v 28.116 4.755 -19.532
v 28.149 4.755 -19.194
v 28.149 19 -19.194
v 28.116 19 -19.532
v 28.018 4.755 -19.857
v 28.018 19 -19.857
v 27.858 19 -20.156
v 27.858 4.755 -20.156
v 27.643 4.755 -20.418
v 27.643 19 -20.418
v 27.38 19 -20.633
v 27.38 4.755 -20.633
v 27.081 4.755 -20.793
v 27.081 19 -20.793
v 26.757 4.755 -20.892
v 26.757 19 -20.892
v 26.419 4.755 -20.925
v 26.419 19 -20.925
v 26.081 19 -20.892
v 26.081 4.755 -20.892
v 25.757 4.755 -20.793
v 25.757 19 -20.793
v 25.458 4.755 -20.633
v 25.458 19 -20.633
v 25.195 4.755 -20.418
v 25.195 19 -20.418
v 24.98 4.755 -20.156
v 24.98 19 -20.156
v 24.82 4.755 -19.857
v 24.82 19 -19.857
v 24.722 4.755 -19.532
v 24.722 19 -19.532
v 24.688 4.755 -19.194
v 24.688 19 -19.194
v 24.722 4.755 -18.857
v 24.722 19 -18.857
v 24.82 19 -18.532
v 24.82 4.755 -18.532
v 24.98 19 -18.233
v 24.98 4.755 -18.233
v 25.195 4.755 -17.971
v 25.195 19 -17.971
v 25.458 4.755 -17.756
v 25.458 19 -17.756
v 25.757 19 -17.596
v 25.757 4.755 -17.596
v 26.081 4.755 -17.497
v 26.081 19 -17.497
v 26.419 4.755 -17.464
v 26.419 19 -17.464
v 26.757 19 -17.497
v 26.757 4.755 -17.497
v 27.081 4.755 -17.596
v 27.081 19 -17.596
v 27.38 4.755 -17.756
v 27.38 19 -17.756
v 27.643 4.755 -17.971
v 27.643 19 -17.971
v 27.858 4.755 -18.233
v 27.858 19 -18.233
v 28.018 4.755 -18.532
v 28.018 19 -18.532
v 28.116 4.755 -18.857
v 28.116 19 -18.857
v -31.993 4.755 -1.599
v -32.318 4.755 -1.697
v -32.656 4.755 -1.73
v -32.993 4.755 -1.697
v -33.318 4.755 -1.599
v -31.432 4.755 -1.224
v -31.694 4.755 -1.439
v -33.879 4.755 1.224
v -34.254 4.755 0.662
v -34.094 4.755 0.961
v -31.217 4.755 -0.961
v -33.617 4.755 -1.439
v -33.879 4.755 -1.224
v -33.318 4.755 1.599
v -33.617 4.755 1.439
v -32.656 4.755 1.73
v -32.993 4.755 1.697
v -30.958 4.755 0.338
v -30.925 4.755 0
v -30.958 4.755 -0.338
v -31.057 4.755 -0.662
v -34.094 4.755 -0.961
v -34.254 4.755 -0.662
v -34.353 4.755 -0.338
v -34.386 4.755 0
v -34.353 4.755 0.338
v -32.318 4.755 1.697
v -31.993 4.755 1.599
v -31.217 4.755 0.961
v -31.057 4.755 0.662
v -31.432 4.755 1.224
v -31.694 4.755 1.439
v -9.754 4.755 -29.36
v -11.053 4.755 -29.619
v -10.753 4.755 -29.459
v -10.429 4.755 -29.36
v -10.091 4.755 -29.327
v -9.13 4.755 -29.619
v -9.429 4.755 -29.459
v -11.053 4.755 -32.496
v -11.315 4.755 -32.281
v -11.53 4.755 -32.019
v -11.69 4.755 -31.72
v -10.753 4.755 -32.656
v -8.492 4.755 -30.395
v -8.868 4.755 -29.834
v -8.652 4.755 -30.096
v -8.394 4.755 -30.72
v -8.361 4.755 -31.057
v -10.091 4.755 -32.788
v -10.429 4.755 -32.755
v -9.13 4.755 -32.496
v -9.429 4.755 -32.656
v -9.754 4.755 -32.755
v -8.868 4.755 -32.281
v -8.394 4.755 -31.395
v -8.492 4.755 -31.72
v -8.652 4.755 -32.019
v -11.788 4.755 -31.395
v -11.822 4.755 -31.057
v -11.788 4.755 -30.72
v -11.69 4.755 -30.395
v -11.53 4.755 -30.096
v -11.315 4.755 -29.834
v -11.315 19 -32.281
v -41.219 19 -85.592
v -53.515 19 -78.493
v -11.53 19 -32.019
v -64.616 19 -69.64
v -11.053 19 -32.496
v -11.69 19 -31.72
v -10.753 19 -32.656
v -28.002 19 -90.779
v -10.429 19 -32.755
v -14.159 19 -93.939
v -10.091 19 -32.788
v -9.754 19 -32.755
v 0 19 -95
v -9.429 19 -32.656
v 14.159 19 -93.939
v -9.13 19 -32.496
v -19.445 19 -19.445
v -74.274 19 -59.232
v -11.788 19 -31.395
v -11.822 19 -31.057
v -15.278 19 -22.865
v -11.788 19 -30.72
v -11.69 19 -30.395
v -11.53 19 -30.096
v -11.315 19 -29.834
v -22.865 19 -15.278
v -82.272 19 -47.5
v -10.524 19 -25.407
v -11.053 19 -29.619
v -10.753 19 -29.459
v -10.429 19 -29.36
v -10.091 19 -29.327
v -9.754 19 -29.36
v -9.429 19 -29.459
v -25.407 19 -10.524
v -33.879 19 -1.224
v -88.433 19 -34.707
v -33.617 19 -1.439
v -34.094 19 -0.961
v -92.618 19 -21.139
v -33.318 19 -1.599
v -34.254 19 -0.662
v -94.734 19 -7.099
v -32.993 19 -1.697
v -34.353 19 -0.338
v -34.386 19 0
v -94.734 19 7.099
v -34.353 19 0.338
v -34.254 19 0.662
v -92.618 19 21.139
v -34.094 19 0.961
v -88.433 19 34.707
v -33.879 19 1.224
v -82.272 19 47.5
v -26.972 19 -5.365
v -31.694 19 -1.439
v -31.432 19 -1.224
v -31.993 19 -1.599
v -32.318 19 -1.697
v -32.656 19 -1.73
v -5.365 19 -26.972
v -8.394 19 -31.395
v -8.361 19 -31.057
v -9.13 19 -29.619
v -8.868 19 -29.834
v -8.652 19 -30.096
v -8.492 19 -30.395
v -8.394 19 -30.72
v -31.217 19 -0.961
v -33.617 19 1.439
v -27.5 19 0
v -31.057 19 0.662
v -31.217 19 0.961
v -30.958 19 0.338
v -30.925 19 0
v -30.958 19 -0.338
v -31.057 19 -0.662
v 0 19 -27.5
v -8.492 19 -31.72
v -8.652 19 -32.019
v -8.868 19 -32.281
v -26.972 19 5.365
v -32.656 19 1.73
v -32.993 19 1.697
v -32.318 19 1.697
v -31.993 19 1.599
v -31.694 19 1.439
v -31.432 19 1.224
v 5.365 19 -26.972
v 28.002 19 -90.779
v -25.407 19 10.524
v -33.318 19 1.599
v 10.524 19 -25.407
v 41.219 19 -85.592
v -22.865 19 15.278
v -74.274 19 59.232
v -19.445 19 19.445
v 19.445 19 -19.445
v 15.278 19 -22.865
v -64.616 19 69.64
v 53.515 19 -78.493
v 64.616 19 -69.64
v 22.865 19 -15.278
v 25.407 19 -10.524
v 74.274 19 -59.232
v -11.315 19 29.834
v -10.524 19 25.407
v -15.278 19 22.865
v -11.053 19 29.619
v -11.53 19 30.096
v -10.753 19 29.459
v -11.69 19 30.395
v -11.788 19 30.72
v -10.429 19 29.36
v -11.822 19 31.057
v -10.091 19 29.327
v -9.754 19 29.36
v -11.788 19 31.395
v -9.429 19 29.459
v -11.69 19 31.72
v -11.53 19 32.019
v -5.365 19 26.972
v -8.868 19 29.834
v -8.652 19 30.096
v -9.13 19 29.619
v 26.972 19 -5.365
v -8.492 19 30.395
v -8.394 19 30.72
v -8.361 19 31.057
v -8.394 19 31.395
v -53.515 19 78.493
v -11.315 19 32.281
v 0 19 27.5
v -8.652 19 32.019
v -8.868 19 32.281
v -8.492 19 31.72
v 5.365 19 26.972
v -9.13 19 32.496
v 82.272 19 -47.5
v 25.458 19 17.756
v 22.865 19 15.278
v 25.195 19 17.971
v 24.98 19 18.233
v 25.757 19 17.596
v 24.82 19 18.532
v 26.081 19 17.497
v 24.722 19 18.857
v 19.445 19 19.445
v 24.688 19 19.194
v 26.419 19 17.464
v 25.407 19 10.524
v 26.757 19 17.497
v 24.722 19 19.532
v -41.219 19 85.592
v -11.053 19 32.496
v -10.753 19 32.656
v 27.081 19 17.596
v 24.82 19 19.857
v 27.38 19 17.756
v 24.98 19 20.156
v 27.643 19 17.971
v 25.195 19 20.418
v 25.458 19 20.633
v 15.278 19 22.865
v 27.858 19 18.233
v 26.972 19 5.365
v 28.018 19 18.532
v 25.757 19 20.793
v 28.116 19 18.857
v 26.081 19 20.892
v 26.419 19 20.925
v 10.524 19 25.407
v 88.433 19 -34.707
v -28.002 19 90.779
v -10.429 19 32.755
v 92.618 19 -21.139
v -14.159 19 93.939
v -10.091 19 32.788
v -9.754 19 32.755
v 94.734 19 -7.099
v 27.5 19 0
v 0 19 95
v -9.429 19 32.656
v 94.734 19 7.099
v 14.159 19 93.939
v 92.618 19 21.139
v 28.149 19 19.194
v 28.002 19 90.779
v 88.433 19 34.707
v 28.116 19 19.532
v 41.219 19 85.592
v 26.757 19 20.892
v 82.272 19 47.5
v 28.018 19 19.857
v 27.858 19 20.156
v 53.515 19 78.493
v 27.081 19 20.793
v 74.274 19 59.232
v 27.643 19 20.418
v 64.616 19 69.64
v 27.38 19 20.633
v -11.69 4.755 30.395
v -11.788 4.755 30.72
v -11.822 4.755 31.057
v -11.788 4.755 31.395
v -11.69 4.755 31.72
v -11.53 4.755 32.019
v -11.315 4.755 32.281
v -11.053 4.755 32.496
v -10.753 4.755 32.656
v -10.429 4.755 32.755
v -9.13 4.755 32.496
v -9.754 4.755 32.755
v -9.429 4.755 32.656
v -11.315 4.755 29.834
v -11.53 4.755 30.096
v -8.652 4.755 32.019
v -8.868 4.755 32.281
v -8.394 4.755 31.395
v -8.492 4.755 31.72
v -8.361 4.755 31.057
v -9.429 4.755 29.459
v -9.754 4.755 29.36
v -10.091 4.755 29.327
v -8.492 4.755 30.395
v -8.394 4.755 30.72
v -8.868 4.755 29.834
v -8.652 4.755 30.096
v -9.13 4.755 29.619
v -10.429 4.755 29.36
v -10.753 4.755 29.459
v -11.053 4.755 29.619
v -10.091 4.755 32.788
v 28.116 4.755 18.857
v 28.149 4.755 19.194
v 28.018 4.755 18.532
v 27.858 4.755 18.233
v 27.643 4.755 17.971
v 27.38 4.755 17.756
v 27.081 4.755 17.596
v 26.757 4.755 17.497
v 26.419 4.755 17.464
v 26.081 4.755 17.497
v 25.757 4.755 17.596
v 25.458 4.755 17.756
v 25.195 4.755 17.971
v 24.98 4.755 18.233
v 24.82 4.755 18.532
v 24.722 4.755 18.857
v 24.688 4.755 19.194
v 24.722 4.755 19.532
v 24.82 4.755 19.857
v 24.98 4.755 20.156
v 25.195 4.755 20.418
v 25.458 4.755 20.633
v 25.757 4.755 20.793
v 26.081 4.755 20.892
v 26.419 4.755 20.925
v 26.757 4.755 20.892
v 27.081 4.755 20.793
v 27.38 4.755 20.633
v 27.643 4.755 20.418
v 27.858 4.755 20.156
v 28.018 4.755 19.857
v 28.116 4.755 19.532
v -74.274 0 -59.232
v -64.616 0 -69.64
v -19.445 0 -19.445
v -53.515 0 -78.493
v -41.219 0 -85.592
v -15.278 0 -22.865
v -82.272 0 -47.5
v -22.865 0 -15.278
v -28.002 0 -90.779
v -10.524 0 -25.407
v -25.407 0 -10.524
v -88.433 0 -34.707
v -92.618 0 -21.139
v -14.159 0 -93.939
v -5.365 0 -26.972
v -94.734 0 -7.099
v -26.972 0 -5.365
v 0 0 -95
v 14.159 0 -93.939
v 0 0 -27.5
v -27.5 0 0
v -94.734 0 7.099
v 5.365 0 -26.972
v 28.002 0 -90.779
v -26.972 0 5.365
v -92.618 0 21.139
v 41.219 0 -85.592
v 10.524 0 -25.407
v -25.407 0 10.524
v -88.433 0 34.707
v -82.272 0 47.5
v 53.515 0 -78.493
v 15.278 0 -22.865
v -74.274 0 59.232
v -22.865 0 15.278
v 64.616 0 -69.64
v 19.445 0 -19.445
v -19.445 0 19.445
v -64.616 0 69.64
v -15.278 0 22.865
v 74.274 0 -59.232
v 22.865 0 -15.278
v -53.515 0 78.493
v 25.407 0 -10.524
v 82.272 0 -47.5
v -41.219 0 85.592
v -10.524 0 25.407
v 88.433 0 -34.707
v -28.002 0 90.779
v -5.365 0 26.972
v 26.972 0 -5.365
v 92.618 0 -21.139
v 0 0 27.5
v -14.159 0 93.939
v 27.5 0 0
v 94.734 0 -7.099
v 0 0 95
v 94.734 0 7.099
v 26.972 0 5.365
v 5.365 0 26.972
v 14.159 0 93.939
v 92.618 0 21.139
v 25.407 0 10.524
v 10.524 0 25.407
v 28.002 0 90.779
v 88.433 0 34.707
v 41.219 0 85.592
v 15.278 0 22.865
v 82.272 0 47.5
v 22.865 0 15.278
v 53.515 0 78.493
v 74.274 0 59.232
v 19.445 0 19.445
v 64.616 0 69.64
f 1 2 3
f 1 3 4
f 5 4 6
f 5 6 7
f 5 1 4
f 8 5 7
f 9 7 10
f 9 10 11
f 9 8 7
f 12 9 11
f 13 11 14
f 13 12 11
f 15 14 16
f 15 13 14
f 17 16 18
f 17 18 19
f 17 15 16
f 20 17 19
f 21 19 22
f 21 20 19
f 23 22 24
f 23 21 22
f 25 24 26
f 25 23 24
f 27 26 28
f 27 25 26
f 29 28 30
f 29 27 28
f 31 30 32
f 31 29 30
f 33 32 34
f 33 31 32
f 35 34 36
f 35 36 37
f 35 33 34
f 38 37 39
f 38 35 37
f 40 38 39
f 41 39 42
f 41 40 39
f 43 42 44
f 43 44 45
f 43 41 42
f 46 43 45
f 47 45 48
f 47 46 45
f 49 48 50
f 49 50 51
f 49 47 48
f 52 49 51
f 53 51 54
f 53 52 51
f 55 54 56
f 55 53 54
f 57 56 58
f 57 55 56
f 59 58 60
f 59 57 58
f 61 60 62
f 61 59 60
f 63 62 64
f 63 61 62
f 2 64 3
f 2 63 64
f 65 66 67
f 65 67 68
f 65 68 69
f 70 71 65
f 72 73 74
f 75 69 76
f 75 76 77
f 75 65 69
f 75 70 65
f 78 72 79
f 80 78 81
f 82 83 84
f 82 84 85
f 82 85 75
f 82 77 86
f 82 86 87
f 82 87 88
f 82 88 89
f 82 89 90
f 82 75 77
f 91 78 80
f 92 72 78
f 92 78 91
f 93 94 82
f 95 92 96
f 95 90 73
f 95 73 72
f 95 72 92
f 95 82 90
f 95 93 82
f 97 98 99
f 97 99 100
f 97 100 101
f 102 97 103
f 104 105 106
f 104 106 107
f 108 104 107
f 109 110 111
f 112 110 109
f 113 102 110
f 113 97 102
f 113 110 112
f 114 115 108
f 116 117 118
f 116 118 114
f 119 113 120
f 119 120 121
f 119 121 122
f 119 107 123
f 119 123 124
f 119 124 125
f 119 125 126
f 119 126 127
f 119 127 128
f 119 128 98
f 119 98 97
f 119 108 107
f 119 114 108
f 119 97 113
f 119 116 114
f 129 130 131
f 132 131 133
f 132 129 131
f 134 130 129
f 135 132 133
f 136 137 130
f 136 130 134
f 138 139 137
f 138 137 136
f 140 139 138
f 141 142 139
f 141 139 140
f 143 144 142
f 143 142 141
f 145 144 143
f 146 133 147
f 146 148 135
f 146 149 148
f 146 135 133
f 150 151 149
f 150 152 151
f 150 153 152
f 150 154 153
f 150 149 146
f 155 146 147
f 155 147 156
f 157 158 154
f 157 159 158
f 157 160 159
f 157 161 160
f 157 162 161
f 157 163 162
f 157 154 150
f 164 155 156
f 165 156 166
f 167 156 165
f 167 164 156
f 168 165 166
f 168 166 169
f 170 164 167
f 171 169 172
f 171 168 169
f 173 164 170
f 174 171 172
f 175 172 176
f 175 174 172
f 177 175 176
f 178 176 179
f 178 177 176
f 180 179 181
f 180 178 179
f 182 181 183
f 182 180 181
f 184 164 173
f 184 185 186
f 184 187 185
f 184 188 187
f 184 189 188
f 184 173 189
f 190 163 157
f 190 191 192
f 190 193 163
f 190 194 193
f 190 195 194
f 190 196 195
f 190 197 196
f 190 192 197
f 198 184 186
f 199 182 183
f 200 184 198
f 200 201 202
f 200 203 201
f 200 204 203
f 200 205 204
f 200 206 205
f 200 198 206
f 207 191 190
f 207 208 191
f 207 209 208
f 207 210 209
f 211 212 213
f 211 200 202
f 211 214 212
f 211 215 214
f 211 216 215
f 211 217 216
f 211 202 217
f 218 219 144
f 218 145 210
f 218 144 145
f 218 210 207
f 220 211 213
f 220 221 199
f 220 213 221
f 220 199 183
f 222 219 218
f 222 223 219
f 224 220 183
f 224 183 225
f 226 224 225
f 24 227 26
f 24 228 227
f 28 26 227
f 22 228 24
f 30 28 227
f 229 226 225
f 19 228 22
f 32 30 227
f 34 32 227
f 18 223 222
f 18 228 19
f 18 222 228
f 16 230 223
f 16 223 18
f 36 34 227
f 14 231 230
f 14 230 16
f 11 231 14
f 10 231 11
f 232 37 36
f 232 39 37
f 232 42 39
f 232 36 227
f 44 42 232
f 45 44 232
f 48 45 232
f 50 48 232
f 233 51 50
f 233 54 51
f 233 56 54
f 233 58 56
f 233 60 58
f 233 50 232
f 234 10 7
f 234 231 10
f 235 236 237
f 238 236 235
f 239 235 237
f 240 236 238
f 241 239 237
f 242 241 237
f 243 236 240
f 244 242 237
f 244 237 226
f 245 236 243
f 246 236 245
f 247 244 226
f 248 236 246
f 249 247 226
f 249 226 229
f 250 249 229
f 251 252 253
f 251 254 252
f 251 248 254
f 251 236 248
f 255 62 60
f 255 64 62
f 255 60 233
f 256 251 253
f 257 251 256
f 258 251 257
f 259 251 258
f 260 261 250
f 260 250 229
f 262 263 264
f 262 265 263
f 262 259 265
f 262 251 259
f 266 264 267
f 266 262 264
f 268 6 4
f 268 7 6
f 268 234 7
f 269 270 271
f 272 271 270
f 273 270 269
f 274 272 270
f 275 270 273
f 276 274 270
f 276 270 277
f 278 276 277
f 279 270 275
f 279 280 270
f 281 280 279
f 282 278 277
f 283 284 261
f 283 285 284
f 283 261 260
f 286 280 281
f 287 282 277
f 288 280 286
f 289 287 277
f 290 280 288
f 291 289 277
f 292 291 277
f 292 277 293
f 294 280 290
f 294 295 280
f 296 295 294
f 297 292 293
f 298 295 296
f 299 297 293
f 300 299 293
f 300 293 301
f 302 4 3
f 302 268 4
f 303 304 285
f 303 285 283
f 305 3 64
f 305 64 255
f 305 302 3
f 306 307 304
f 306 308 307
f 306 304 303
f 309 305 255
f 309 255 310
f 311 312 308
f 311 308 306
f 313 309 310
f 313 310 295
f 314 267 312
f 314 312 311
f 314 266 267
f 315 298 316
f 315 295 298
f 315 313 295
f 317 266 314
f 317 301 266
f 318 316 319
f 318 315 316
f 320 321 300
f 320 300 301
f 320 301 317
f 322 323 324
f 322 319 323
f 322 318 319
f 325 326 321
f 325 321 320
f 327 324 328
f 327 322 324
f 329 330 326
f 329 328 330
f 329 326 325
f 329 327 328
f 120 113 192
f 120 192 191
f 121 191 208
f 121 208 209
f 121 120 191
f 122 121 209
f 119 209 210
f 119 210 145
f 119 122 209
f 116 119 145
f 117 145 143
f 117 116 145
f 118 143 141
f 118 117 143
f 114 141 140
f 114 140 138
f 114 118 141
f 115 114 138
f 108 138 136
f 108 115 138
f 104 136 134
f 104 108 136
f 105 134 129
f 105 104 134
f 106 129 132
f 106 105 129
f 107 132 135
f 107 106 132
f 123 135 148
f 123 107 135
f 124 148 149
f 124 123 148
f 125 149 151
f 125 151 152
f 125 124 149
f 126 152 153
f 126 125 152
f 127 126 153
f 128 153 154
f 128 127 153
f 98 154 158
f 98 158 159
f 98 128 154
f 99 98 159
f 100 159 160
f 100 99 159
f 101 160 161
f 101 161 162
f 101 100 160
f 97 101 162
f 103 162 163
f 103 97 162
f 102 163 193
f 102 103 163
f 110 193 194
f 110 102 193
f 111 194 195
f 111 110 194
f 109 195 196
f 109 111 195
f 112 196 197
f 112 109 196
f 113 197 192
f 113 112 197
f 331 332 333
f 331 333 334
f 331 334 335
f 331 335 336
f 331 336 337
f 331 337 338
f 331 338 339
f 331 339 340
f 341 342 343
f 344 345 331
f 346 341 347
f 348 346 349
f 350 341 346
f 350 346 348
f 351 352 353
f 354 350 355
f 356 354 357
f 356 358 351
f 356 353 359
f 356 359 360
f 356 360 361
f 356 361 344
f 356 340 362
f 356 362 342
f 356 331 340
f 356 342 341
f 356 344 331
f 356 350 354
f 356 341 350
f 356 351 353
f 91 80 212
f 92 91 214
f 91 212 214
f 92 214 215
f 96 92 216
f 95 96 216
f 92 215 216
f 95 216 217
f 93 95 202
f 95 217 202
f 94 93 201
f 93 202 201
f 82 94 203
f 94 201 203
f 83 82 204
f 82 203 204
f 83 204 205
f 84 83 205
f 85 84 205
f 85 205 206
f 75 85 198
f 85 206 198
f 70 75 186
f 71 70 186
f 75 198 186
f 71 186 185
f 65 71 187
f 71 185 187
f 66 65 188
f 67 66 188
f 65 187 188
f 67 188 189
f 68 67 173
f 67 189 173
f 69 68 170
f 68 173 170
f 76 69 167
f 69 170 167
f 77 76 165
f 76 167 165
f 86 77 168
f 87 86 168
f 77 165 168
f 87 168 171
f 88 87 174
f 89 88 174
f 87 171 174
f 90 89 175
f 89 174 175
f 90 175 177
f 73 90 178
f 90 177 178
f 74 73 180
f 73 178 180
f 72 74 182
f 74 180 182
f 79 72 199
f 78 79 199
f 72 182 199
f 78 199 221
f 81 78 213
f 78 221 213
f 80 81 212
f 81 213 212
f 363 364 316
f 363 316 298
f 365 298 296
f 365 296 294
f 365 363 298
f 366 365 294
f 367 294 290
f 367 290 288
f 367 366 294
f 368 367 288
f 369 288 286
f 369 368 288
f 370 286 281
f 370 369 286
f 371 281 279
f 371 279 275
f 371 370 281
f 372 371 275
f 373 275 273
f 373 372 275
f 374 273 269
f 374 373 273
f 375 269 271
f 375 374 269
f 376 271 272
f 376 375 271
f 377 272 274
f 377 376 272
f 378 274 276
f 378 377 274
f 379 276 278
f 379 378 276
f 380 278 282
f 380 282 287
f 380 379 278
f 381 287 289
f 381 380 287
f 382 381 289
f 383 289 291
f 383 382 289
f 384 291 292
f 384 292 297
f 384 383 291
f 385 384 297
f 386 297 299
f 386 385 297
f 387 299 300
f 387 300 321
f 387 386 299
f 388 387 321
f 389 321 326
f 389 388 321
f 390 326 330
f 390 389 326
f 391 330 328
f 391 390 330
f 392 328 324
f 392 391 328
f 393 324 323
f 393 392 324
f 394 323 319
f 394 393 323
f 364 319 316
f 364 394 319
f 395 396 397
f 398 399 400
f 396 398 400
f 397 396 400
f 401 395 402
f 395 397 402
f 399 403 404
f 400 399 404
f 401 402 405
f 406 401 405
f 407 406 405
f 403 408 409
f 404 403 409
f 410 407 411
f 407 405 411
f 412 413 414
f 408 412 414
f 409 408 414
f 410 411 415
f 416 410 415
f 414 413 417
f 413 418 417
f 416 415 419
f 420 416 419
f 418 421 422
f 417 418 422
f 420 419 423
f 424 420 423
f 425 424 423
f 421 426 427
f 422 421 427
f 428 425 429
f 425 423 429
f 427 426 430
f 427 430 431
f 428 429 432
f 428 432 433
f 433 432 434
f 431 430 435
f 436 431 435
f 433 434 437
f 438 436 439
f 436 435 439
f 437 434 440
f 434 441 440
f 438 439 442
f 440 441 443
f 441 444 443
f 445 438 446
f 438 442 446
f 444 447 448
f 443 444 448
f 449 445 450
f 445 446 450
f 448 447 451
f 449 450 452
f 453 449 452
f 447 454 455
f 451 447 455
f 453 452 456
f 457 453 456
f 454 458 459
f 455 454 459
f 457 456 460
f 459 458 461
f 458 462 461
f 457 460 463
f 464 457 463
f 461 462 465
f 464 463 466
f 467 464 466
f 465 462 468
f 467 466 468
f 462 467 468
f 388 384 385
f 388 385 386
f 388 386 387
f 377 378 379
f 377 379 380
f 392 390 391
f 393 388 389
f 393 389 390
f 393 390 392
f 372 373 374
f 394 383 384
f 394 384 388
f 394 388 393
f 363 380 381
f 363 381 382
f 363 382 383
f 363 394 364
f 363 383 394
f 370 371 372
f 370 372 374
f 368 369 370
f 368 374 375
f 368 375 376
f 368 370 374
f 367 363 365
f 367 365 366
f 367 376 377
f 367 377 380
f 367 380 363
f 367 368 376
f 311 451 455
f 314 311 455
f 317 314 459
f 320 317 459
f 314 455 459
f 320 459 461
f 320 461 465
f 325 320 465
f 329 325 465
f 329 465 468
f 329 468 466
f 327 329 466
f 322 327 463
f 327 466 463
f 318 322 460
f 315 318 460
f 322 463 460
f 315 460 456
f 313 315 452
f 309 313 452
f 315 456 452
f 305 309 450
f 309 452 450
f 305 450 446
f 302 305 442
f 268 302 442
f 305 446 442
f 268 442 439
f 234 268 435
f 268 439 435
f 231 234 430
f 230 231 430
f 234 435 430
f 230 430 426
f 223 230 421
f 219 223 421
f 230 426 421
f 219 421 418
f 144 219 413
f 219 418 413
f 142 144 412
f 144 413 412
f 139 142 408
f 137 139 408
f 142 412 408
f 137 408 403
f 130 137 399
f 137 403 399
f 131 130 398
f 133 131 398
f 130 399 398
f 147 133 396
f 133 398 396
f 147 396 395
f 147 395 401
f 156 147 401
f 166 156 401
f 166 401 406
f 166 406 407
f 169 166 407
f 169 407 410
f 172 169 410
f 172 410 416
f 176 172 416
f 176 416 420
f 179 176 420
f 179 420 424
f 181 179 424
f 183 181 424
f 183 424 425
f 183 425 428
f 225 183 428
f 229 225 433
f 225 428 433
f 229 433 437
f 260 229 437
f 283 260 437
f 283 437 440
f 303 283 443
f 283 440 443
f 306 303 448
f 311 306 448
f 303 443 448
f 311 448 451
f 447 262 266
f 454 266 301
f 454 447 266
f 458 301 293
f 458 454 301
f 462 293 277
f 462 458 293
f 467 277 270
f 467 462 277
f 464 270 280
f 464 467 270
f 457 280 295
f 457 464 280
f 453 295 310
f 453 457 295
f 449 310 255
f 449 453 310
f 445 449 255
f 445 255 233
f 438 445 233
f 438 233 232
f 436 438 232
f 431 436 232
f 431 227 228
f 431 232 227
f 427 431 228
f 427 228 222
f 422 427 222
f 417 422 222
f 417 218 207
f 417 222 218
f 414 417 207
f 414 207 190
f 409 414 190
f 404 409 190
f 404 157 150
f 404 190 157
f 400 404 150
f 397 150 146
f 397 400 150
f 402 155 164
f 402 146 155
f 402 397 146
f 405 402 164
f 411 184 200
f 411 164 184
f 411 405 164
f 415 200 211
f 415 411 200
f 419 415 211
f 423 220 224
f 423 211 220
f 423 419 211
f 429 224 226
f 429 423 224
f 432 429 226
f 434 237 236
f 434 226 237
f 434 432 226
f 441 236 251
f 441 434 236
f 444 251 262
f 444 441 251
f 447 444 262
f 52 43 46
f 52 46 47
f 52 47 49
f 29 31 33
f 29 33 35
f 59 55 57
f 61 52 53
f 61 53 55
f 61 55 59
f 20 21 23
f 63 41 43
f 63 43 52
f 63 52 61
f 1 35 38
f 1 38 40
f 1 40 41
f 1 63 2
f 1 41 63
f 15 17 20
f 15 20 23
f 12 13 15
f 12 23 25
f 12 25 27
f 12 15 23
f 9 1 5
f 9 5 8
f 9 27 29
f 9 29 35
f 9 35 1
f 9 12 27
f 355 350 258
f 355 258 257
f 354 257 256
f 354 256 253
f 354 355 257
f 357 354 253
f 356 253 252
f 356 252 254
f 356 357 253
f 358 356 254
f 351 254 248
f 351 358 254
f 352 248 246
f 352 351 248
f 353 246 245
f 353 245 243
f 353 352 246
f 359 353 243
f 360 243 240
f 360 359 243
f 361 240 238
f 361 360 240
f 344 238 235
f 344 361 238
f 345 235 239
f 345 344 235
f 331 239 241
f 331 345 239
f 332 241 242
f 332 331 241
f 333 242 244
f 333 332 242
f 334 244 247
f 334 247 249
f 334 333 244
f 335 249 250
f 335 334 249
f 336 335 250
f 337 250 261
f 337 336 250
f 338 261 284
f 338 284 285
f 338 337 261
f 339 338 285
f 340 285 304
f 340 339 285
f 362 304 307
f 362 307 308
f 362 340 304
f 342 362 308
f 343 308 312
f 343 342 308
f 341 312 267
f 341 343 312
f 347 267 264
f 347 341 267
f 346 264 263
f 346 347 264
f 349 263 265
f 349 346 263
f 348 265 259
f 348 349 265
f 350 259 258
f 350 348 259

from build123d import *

# Parameters (mm, degrees)
SKETCH1_R           = 95
BOSS_EXTRUDE1_DEPTH = 19
SKETCH2_R           = 27.5
CUT_EXTRUDE1_DEPTH  = 136.687140142
SKETCH3_R           = 1.730453225
CUT_EXTRUDE2_DEPTH  = 14.244742321
CIRPATTERN1_COUNT   = 5


with BuildPart() as part:
    # Sketch1 → Boss-Extrude1 (new body)
    with BuildSketch(Plane(origin=(0, 0, 0), x_dir=(1, 0, 0), z_dir=(0, 1, 0))):
        Circle(SKETCH1_R)
    extrude(amount=BOSS_EXTRUDE1_DEPTH)

    # Sketch2 → Cut-Extrude1 (cut, through all)
    with BuildSketch(Plane(origin=(0, 0, 0), x_dir=(1, 0, 0), z_dir=(0, 1, 0))):
        Circle(SKETCH2_R)
    extrude(amount=CUT_EXTRUDE1_DEPTH, mode=Mode.SUBTRACT)

    # Sketch3 → Cut-Extrude2 (cut)
    with BuildSketch(Plane(origin=(0, 19, 0), x_dir=(1, 0, 0), z_dir=(0, 1, 0))):
        with Locations((-32.655618967, 0)):
            Circle(SKETCH3_R)
    cut_extrude2 = extrude(amount=-CUT_EXTRUDE2_DEPTH, mode=Mode.SUBTRACT)

    # CirPattern1: Cut-Extrude2 ×5 about axis
    cirpattern1_axis = Axis((0, 0, 0), (0, 1, 0))
    for i in range(1, CIRPATTERN1_COUNT):
        add(cut_extrude2.rotate(cirpattern1_axis, i * 360 / CIRPATTERN1_COUNT), mode=Mode.SUBTRACT)


solid = part.part
